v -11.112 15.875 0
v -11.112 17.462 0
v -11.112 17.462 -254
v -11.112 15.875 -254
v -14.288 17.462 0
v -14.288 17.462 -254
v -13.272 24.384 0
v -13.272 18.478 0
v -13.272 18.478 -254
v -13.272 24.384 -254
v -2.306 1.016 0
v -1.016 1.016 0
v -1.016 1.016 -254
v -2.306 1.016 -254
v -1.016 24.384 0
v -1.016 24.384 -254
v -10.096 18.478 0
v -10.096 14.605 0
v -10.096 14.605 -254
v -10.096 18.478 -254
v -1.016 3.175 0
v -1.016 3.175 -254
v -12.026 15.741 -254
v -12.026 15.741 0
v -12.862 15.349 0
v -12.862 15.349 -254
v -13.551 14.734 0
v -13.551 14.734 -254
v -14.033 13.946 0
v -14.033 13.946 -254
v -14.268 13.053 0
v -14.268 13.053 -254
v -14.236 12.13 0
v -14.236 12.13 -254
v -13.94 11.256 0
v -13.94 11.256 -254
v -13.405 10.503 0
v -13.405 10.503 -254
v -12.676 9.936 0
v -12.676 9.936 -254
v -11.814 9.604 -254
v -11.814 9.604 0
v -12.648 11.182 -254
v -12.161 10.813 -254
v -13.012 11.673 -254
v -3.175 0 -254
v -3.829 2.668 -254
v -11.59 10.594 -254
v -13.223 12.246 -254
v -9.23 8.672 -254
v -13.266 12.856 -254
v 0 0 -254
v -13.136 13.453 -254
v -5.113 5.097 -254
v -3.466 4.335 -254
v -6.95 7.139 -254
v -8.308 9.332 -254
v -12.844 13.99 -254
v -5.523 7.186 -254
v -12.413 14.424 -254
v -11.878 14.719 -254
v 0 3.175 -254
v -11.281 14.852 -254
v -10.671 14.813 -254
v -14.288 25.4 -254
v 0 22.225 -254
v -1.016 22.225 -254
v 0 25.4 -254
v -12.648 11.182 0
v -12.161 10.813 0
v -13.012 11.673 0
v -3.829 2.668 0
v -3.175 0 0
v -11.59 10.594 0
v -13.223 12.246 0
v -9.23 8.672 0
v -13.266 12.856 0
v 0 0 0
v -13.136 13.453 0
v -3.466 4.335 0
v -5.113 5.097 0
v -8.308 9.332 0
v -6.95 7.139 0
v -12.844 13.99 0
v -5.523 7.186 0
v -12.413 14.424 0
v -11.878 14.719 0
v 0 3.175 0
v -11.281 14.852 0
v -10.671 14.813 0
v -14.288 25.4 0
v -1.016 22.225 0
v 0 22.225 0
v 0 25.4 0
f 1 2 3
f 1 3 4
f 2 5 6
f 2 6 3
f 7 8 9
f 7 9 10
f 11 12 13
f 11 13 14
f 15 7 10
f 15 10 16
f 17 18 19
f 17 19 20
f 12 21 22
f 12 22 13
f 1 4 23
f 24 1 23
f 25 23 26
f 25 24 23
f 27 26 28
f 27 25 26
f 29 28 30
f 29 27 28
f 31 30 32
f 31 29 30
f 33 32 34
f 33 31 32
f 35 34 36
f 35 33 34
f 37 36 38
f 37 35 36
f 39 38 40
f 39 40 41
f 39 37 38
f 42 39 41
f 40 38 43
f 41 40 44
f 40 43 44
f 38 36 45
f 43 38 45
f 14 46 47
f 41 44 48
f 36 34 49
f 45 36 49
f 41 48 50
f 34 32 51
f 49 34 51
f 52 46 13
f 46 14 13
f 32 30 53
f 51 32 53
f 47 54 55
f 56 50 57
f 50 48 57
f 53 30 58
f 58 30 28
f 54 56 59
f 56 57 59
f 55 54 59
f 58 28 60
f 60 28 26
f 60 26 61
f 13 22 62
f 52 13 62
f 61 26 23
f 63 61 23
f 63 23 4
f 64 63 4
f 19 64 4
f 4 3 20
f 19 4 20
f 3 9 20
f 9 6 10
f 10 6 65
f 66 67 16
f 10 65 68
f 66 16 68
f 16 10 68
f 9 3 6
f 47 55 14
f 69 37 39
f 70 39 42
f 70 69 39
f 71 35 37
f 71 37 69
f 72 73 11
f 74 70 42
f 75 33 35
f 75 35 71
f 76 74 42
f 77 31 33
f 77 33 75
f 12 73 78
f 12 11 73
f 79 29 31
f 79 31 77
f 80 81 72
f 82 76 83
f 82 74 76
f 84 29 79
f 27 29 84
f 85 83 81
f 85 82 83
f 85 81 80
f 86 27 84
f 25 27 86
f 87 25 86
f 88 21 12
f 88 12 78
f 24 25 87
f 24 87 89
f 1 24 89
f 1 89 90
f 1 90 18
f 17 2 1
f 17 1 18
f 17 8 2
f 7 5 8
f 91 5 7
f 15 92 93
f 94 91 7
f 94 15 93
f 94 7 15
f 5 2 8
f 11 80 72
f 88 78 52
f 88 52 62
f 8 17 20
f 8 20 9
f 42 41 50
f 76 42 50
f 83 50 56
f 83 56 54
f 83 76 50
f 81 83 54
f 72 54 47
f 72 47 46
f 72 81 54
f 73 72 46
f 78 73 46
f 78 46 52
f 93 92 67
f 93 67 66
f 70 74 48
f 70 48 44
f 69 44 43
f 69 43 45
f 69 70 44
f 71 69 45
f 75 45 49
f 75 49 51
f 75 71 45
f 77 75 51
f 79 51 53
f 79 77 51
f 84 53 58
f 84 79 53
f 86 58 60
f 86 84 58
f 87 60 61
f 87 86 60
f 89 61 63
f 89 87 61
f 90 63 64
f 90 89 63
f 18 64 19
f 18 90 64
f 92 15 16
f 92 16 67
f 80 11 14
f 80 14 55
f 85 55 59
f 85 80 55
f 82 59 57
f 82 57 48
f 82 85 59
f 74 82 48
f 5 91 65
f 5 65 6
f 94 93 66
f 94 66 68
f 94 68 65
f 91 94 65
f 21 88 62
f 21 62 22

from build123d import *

# Parameters (mm, degrees)
EXTRUDE_THIN1_DEPTH = 254


with BuildPart() as part:
    # Sketch1 → Extrude-Thin1 (new body)
    with BuildSketch(Plane.XY):
        with BuildLine():
            Line((0, 22.225), (0, 25.4))
            Line((0, 25.4), (-14.2875, 25.4))
            Line((-14.2875, 25.4), (-14.2875, 17.4625))
            Line((-14.2875, 17.4625), (-11.1125, 17.4625))
            Line((-11.1125, 17.4625), (-11.1125, 15.875))
            ThreePointArc((-11.1125, 15.875), (-14.26780648, 13.053080749), (-11.814281402, 9.603529774))
            ThreePointArc((-11.814281402, 9.603529774), (-5.968853266, 6.174354687), (-3.175, 0))
            Line((-3.175, 0), (0, 0))
            Line((0, 0), (0, 3.175))
            Line((0, 3.175), (-1.016, 3.175))
            Line((-1.016, 3.175), (-1.016, 1.016))
            Line((-1.016, 1.016), (-2.305663985, 1.016))
            ThreePointArc((-2.305663985, 1.016), (-5.523409467, 7.185708972), (-11.589711354, 10.594400246))
            ThreePointArc((-11.589711354, 10.594400246), (-13.135814335, 13.453312752), (-10.0965, 14.605))
            Line((-10.0965, 14.605), (-10.0965, 18.4785))
            Line((-10.0965, 18.4785), (-13.2715, 18.4785))
            Line((-13.2715, 18.4785), (-13.2715, 24.384))
            Line((-13.2715, 24.384), (-1.016, 24.384))
            Line((-1.016, 24.384), (-1.016, 22.225))
            Line((-1.016, 22.225), (0, 22.225))
        make_face()
    extrude(amount=-EXTRUDE_THIN1_DEPTH)


solid = part.part
